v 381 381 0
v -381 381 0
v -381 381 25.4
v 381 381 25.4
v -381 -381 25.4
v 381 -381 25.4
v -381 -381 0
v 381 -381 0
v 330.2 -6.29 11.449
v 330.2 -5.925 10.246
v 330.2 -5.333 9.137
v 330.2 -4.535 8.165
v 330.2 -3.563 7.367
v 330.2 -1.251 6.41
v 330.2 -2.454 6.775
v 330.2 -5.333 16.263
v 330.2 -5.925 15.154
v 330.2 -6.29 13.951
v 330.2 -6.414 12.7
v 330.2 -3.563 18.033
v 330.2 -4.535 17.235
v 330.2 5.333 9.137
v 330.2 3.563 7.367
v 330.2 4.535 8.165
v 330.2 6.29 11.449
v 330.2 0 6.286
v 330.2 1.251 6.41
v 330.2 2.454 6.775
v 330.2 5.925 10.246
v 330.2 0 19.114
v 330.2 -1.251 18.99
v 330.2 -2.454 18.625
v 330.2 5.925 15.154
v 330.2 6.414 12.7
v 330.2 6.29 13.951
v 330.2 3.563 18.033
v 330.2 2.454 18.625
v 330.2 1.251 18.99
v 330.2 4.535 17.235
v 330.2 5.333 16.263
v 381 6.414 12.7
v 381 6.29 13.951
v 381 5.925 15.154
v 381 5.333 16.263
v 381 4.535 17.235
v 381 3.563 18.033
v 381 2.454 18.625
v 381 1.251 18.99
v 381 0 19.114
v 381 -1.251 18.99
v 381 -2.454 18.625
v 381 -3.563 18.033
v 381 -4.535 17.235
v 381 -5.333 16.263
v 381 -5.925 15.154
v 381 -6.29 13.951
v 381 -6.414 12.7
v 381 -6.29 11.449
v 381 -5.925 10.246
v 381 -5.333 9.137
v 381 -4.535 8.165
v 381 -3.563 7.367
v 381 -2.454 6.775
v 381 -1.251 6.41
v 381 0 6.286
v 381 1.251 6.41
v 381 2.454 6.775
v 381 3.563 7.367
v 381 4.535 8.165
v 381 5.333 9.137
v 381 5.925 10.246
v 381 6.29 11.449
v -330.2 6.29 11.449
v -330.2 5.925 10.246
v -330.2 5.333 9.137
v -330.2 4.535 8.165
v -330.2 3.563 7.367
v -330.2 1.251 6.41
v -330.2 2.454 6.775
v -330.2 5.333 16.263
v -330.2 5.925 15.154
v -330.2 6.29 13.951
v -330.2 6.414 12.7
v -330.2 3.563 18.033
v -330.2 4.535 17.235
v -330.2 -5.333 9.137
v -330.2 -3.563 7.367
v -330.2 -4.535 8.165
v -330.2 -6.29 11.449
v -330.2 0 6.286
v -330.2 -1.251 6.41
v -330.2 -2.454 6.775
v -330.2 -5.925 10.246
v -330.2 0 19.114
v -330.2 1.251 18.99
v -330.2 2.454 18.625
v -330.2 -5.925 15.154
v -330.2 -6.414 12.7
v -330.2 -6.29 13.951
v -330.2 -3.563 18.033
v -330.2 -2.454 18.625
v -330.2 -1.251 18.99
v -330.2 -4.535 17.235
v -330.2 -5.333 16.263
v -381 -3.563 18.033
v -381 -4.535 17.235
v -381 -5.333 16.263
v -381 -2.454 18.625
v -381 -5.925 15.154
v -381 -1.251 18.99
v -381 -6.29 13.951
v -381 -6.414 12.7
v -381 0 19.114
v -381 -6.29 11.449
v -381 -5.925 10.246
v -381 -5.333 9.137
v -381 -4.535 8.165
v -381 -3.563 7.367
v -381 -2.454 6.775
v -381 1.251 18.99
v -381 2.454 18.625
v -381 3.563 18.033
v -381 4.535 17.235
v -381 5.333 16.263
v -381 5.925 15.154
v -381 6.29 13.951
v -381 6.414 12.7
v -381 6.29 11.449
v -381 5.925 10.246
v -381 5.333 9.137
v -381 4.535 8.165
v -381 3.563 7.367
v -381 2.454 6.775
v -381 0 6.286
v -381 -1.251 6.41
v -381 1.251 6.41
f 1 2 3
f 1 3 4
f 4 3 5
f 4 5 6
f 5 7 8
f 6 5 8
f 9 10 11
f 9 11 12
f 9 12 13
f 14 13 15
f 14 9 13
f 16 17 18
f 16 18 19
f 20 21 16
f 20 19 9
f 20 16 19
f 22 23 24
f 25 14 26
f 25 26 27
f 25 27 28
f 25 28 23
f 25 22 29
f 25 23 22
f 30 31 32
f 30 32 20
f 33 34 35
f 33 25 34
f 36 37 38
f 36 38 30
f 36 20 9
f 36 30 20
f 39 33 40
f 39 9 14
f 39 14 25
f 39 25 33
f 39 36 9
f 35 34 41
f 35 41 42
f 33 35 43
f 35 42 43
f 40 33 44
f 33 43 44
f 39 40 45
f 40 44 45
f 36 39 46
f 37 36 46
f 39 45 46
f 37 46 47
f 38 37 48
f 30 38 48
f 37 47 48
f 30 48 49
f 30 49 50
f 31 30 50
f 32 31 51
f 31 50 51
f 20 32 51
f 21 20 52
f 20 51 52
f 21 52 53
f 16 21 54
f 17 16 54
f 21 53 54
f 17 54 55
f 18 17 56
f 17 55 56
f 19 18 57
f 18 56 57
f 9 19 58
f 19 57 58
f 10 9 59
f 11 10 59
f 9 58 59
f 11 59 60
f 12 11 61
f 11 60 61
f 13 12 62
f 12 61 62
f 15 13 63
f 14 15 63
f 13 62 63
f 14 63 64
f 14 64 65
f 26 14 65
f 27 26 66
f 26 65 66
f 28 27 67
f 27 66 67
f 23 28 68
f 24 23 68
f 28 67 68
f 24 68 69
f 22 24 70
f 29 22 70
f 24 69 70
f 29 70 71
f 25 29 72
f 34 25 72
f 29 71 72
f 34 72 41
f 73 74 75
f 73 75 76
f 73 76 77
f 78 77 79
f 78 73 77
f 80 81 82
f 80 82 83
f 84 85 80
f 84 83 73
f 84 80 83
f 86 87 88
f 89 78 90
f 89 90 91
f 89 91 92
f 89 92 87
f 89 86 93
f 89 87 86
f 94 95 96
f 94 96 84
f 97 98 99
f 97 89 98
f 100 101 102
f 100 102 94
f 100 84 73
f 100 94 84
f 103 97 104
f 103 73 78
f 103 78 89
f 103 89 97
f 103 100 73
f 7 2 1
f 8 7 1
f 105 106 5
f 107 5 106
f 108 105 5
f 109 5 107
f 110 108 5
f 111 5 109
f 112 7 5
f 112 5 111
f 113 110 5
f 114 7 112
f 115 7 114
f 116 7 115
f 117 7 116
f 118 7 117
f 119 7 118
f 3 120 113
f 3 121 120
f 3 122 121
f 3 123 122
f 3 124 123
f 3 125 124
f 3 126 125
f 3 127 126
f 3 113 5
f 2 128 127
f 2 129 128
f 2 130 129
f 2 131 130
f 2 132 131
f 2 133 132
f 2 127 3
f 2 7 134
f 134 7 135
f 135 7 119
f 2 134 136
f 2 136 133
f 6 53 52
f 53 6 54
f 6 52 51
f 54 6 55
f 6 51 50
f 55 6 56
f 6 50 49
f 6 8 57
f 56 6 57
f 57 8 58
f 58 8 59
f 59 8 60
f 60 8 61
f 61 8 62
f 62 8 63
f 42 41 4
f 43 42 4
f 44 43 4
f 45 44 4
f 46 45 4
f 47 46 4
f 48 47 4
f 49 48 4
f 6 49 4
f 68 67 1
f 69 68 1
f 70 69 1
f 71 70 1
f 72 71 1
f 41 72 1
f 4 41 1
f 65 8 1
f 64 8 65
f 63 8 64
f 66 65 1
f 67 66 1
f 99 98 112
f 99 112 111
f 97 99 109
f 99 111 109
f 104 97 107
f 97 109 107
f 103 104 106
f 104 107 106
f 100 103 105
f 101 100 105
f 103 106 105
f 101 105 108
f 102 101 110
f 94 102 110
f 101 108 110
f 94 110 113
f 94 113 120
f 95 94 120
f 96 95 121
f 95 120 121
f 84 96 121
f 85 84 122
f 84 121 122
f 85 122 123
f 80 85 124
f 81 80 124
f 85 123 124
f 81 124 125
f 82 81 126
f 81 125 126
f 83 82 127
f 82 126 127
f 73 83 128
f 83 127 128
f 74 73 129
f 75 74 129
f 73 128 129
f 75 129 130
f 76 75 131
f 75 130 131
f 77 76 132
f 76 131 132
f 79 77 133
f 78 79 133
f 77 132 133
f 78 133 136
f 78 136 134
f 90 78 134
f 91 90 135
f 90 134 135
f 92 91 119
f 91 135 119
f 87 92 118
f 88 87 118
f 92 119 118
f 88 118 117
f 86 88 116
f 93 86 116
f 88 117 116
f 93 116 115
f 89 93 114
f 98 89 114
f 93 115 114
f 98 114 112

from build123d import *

# Parameters (mm, degrees)
F0_W     = 762
F0_H     = 762
F1_DEPTH = 25.4
F2_R     = 6.4135
F3_DEPTH = 50.8
F4_R     = 6.4135
F5_DEPTH = 50.8


with BuildPart() as f1:
    # F0 (on Top) → F1 (new body)
    with BuildSketch(Plane.XY):
        Rectangle(F0_W, F0_H)
    extrude(amount=F1_DEPTH)

    # F2 (on face) → F3 (cut)
    with BuildSketch(Plane.YZ.offset(381)):
        with Locations((0, 12.7)):
            Circle(F2_R)
    extrude(amount=-F3_DEPTH, mode=Mode.SUBTRACT)

    # F4 (on face) → F5 (cut)
    with BuildSketch(Plane(origin=(-381, 0, 0), x_dir=(0, -1, 0), z_dir=(-1, 0, 0))):
        with Locations((0, 12.7)):
            Circle(F4_R)
    extrude(amount=-F5_DEPTH, mode=Mode.SUBTRACT)


solid = f1.part
